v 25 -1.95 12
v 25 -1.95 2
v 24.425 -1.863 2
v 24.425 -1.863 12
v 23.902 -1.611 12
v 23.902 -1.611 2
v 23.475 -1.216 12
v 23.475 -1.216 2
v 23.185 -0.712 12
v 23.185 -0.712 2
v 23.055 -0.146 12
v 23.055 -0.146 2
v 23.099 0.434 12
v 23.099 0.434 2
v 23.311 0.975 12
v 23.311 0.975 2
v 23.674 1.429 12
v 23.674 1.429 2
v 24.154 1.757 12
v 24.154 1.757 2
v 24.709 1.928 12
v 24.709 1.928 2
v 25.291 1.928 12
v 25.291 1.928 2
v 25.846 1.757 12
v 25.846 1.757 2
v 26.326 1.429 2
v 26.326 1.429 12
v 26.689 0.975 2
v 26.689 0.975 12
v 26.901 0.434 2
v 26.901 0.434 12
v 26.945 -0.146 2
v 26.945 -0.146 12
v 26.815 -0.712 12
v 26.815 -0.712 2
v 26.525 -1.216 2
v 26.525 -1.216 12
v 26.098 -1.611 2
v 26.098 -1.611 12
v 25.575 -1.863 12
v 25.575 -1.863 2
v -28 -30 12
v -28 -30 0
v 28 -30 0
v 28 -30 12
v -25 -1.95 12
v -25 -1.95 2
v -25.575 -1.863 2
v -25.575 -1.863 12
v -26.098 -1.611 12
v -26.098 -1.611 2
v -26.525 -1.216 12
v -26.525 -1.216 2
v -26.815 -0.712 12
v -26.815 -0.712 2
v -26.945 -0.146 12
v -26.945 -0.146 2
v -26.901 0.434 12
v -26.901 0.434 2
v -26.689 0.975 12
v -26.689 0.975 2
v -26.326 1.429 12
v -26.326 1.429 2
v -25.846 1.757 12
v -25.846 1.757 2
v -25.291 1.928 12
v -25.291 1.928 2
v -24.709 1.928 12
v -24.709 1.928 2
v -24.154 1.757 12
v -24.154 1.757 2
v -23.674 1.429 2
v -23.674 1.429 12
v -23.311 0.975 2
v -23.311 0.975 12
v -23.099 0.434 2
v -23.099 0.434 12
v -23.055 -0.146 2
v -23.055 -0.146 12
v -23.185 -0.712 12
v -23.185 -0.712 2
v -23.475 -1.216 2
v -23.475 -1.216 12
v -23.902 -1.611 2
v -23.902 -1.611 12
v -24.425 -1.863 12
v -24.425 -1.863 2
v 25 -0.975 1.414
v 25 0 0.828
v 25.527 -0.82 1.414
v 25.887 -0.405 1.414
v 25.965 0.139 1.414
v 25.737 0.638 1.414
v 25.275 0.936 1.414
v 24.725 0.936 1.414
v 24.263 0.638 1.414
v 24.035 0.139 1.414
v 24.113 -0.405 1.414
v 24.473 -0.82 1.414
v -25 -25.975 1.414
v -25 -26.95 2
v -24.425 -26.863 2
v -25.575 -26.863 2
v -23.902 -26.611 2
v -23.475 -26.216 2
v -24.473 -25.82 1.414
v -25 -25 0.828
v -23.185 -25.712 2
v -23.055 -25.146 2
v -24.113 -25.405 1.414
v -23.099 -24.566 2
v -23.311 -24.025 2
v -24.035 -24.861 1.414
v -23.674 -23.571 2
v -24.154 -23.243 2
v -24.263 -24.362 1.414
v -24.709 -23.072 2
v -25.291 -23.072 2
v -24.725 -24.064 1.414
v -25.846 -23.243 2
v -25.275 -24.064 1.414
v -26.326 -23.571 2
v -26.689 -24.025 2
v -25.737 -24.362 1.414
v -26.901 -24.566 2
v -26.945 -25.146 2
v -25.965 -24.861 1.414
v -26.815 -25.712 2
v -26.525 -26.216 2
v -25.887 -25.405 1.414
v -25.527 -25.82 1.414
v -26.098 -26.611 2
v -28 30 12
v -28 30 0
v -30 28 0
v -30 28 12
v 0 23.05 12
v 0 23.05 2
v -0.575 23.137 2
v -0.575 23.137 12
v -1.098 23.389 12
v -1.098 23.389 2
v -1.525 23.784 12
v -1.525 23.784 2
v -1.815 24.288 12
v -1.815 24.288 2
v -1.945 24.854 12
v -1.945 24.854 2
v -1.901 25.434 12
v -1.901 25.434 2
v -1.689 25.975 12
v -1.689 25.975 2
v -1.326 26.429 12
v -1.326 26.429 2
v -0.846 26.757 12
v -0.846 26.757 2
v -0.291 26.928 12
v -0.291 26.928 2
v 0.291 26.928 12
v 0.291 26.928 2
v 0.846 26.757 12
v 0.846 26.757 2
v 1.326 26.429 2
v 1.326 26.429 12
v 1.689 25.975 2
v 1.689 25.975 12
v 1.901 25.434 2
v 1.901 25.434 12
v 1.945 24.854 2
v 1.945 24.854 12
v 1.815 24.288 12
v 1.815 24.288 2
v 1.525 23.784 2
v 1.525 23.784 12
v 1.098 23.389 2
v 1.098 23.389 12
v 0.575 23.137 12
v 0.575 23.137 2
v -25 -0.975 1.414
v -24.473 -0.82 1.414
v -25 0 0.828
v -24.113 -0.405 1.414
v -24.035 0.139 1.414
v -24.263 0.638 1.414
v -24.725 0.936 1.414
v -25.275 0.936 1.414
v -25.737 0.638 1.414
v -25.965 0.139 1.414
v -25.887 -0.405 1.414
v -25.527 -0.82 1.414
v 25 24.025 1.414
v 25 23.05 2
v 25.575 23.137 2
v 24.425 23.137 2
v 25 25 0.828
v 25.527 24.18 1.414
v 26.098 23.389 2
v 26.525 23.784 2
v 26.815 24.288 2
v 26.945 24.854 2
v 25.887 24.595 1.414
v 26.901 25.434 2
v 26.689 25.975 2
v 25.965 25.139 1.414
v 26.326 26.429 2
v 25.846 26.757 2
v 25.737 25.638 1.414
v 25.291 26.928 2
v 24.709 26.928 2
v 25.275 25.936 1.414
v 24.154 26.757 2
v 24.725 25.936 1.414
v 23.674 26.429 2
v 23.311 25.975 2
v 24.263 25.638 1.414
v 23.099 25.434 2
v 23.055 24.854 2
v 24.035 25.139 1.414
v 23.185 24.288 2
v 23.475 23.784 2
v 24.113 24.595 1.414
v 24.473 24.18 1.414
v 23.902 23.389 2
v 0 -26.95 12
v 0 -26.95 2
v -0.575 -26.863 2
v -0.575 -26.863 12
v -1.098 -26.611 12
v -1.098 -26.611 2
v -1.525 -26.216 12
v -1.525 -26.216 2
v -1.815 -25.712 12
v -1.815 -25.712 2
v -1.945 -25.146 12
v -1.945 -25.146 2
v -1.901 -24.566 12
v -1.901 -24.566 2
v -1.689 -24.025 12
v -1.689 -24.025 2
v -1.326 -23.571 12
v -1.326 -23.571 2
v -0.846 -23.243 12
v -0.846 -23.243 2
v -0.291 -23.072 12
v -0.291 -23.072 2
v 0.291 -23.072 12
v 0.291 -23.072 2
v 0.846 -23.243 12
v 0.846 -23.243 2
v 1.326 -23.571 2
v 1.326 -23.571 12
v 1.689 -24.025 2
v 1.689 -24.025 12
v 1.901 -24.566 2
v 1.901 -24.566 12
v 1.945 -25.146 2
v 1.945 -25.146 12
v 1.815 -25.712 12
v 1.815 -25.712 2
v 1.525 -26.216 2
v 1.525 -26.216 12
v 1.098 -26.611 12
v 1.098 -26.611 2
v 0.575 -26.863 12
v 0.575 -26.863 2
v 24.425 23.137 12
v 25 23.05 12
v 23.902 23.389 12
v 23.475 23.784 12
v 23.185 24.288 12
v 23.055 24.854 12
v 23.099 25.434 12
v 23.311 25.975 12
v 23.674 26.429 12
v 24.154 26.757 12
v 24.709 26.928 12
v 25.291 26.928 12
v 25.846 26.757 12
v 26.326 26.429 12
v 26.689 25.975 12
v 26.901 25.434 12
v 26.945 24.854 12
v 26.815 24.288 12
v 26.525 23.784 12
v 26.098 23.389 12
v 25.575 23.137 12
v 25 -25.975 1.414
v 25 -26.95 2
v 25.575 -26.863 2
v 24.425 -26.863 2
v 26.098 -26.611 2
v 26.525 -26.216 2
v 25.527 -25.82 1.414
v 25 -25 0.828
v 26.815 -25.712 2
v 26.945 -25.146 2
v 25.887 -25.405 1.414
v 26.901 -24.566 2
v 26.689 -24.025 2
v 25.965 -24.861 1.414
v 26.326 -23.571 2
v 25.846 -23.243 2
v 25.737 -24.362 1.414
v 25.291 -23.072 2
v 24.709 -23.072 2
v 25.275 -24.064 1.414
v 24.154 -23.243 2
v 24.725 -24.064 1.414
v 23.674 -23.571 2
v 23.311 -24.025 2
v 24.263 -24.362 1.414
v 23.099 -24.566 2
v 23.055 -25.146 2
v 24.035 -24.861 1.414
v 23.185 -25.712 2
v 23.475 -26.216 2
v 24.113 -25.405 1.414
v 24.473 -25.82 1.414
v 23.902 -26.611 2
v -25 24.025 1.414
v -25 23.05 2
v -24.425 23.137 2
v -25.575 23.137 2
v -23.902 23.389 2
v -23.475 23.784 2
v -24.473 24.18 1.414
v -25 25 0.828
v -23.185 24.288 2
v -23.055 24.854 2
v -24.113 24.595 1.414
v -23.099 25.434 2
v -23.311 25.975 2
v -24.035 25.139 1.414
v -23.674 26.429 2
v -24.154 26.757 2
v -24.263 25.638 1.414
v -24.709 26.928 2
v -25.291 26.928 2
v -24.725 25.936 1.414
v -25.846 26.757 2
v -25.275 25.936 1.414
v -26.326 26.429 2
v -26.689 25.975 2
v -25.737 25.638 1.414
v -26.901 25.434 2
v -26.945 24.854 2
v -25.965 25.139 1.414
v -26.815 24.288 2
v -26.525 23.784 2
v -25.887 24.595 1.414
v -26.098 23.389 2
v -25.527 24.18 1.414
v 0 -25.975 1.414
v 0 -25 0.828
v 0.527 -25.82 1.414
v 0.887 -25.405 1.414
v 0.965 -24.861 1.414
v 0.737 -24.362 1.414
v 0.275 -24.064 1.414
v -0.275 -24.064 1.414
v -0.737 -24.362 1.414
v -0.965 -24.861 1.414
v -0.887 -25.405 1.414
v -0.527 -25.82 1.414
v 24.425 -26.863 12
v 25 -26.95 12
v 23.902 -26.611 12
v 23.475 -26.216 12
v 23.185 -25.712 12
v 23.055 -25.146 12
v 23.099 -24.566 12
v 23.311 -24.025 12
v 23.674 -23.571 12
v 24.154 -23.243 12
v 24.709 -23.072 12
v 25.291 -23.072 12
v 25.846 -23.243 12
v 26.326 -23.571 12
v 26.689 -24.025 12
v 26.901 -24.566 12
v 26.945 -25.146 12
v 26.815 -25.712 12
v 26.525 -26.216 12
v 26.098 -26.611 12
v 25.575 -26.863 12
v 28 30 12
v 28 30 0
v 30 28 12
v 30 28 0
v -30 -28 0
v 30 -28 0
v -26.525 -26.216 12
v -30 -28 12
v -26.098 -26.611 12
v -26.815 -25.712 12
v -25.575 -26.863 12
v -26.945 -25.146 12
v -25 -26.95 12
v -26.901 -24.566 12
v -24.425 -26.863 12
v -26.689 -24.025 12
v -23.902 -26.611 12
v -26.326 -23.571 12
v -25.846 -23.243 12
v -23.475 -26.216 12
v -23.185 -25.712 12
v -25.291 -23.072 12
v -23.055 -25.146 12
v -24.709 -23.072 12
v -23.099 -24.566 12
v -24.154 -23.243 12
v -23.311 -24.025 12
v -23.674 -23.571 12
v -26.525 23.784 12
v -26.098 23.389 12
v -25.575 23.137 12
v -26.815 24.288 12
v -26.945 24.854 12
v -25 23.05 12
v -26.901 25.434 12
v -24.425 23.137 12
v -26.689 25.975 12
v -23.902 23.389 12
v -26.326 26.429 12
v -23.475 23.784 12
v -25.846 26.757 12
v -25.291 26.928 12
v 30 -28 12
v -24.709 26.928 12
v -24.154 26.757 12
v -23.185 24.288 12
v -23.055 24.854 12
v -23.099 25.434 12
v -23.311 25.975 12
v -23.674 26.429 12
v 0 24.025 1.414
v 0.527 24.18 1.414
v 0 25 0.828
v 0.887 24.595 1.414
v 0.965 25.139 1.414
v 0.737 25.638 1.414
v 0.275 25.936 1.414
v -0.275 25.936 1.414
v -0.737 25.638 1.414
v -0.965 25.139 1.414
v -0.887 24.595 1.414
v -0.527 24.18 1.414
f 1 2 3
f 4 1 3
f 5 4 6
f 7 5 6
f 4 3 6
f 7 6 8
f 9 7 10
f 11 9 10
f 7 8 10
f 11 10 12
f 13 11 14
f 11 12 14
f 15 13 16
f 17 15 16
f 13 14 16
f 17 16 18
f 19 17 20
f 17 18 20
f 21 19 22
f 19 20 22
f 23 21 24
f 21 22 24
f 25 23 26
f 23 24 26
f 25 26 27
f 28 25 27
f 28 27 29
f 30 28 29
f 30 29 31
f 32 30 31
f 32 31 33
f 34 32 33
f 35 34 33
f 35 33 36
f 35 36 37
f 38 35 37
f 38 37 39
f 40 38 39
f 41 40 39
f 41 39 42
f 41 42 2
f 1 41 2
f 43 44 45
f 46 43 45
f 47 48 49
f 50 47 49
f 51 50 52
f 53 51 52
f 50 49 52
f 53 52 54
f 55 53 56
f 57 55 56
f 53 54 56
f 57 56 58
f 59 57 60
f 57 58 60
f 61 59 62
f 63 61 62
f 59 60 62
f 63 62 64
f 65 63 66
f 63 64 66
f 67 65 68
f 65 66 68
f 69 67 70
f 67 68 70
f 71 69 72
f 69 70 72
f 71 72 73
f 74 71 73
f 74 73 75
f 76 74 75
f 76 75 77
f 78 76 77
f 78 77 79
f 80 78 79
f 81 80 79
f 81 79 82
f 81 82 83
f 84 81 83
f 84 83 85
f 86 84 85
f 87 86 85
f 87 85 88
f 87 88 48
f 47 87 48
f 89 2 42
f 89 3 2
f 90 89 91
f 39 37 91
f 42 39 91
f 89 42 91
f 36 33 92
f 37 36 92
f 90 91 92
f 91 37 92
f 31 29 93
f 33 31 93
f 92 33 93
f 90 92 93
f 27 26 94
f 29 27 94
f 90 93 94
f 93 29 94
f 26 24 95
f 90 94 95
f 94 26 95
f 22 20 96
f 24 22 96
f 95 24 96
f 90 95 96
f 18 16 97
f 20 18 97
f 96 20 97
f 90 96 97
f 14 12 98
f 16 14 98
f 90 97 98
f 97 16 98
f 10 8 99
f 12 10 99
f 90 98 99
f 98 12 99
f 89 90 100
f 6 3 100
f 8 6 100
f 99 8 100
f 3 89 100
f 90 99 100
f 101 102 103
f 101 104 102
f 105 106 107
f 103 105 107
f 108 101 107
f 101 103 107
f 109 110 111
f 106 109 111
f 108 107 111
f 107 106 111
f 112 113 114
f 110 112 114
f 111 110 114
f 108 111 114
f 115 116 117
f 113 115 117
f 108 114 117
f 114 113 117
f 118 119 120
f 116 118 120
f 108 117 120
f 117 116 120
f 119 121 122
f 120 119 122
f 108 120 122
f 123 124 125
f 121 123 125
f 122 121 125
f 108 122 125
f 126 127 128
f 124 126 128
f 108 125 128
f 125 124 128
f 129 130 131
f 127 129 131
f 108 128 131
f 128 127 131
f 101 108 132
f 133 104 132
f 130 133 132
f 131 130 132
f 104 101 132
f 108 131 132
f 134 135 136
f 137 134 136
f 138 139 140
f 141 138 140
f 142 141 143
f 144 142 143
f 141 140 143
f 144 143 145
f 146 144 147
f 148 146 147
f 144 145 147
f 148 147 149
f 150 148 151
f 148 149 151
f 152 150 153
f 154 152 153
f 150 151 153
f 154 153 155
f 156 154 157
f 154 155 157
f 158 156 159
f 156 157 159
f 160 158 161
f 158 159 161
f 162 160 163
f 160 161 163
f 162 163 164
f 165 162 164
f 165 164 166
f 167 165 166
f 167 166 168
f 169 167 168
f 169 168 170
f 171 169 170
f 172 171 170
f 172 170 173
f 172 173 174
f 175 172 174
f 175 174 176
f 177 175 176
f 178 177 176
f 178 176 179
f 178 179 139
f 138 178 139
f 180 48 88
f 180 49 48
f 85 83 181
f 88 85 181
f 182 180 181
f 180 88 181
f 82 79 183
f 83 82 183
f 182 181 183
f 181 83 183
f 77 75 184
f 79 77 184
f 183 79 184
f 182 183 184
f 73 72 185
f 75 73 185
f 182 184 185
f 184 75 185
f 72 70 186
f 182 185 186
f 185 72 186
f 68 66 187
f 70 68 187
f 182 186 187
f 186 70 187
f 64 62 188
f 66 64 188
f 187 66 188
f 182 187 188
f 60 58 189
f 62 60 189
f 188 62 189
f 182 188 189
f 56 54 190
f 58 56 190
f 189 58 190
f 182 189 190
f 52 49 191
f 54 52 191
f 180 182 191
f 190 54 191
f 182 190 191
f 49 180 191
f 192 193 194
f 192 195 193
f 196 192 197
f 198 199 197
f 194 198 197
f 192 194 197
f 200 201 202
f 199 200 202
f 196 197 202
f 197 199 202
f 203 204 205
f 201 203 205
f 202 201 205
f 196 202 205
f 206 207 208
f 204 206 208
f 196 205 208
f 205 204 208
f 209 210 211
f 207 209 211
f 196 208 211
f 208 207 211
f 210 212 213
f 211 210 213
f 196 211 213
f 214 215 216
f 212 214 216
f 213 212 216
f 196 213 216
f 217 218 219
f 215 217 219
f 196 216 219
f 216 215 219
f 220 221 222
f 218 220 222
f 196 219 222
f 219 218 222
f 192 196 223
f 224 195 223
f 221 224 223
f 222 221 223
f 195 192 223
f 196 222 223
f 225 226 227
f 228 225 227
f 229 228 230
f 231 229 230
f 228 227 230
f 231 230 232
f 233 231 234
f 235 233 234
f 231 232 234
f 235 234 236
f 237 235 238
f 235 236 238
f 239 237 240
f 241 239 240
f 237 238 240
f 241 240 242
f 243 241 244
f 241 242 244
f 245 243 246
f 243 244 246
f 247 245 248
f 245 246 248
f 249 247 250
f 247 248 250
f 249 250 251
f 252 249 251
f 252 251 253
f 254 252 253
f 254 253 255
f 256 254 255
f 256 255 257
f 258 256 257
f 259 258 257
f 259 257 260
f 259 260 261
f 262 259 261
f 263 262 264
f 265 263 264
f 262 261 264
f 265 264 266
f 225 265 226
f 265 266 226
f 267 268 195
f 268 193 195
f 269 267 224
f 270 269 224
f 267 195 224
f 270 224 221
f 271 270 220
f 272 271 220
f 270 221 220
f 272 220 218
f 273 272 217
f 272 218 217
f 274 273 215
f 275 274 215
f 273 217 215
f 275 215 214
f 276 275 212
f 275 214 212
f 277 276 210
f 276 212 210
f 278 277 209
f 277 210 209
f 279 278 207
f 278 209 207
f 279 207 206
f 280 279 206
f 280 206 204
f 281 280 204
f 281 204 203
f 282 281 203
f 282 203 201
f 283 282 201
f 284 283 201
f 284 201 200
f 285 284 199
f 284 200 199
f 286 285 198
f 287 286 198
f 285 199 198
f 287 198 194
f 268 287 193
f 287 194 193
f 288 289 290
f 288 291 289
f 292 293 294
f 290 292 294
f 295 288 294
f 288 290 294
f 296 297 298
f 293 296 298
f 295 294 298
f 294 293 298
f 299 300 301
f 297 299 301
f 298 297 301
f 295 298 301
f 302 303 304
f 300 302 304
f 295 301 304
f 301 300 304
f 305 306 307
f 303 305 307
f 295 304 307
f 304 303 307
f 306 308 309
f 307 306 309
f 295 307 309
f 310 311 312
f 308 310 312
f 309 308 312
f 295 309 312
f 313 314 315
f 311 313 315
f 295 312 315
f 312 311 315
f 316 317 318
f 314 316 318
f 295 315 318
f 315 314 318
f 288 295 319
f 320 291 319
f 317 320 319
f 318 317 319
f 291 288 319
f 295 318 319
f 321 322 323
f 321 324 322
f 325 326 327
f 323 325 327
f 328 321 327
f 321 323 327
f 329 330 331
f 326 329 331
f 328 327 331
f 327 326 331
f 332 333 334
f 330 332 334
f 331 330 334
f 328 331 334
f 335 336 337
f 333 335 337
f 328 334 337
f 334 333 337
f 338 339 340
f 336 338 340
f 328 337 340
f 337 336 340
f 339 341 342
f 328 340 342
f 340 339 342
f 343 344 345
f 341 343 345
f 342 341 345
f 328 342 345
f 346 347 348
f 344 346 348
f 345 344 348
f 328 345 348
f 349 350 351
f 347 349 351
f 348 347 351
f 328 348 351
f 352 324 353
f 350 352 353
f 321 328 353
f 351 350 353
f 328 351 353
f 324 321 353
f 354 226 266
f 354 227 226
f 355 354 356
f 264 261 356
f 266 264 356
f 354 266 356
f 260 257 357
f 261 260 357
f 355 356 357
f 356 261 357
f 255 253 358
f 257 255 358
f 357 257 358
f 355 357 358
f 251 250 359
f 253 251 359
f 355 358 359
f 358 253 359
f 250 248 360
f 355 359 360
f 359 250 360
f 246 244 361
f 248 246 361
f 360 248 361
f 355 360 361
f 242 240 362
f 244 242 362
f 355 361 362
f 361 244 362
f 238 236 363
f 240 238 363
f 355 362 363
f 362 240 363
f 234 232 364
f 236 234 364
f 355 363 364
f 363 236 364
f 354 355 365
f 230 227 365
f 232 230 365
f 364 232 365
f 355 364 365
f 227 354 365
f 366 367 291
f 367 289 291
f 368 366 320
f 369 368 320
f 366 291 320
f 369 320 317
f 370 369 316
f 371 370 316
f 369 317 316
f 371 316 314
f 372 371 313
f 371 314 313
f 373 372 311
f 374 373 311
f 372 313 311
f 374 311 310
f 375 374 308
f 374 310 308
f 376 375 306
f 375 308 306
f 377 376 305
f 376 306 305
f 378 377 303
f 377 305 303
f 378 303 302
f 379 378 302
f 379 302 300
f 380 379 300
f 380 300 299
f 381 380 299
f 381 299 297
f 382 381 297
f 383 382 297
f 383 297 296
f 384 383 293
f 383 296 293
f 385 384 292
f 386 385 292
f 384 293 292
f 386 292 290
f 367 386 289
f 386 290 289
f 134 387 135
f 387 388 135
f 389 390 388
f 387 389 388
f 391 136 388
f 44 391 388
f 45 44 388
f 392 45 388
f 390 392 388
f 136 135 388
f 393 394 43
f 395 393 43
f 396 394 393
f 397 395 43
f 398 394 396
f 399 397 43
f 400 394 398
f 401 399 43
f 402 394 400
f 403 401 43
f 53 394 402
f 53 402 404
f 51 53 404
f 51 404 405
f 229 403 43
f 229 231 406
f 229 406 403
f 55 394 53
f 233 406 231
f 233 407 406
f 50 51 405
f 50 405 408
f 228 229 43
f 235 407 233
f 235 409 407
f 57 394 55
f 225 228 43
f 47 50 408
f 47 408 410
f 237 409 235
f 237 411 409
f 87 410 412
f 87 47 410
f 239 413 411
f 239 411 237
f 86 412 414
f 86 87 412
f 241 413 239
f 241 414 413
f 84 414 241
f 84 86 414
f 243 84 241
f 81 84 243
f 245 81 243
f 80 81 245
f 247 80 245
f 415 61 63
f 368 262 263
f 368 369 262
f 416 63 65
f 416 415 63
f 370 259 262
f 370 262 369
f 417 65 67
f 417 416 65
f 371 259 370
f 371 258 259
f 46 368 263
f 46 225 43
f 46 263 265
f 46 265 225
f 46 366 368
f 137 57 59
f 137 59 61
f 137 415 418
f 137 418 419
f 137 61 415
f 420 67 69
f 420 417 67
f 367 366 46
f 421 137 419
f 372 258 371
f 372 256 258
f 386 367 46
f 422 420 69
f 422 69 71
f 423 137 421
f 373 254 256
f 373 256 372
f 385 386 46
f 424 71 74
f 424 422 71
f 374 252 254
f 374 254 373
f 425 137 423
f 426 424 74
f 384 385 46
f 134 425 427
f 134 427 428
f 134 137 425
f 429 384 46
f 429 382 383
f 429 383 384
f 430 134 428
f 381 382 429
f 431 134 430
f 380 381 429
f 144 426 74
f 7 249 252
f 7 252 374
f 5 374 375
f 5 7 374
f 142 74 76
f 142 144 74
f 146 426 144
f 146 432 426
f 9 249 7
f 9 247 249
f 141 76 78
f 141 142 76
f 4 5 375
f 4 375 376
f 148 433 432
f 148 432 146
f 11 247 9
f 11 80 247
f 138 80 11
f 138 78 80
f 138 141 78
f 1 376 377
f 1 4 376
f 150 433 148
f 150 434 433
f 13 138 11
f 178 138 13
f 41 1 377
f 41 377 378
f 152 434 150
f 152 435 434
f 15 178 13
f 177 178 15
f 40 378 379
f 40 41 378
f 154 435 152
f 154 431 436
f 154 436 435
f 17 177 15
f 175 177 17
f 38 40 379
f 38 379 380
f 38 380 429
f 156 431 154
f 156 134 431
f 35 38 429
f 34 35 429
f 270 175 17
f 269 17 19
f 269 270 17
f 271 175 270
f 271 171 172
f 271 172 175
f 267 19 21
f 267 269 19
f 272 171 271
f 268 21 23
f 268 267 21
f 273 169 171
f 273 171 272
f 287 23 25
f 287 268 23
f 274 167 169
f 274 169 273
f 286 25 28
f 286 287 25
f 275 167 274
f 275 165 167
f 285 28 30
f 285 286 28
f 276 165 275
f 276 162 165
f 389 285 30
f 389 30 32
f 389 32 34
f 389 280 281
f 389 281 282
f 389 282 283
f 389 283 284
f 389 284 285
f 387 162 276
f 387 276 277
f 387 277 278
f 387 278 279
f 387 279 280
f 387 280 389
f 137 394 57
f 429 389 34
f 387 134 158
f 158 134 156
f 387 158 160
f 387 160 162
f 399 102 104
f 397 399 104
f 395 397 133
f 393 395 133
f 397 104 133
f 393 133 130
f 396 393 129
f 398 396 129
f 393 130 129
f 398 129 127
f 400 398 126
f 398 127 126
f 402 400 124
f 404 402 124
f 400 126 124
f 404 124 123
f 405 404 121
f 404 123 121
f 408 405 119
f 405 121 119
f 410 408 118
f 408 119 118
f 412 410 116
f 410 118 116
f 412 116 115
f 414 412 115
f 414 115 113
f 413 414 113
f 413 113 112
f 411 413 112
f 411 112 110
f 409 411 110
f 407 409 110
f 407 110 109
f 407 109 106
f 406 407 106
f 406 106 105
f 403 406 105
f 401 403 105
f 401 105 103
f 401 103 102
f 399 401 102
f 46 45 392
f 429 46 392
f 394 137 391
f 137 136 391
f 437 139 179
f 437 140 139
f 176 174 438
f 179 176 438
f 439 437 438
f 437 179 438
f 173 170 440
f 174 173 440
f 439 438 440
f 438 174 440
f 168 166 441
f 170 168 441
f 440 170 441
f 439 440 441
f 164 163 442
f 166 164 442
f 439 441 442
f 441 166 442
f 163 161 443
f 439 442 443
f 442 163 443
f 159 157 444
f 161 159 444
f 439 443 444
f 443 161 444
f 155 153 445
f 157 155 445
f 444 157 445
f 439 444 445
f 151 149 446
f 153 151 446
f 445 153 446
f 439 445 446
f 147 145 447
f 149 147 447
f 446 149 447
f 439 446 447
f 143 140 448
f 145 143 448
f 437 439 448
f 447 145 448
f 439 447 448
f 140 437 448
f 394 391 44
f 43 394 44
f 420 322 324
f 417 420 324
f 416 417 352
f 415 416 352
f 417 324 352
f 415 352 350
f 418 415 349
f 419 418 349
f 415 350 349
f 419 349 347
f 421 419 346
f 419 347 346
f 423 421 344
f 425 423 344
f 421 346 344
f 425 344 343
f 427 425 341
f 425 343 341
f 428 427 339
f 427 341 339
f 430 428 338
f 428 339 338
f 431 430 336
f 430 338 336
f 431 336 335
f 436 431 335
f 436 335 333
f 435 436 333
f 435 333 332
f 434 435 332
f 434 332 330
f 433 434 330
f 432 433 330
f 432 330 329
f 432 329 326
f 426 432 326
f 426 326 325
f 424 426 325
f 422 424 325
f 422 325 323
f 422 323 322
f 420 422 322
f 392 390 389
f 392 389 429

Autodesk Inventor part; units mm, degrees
ref_plane "YZ Plane" through (0, 0, 0) normal (1, 0, 0) x (0, 1, 0)
ref_plane "XZ Plane" through (0, 0, 0) normal (0, 1, 0) x (-1, 0, 0)
ref_plane "XY Plane" through (0, 0, 0) normal (0, 0, 1) x (1, 0, 0)
ref_plane "Work Plane1" through (0, 0, 0) normal (0, 0, 1) x (1, 0, 0)
sketch "Sketch1" plane through (0, 0, 0) normal (0, 0, 1) x (1, 0, 0)
  line L0 (-28, 30) -> (-30, 28) projected
  line L1 (-30, 28) -> (-30, -28) projected
  line L2 (-30, -28) -> (-28, -30) projected
  line L3 (-28, -30) -> (28, -30) projected
  line L4 (28, -30) -> (30, -28) projected
  line L5 (30, -28) -> (30, -17.7934) projected
  line L6 (30, 28) -> (28, 30) projected
  line L7 (28, 30) -> (17.7934, 30) projected
  line L8 (-25, -25) -> (25, -25) construction
  line L9 (25, -25) -> (25, 25) construction
  line L10 (25, 25) -> (-25, 25) construction
  line L11 (-25, 25) -> (-25, -25) construction
  line L12 (-25, -25) -> (25, 25) construction
  line L13 (25, -25) -> (-25, 25) construction
  line L14 (30, -17.7934) -> (44, -17.7934) projected
  line L15 (44, -9.0511) -> (44, -17.7934) projected
  line L16 (30, -9.0511) -> (44, -9.0511) construction
  line L17 (30, -9.0511) -> (30, 8.3051) projected
  line L18 (30, 8.3051) -> (44, 8.3051) projected
  line L19 (44, 19.2331) -> (44, 8.3051) projected
  line L20 (30, 19.2331) -> (44, 19.2331) construction
  line L21 (30, 28) -> (30, -28) projected
  line L22 (17.7934, 30) -> (17.7934, 44) projected
  line L23 (9.0511, 44) -> (17.7934, 44) projected
  line L24 (9.0511, 30) -> (9.0511, 44) construction
  line L25 (-8.3051, 30) -> (-8.3051, 44) projected
  line L26 (-19.2331, 44) -> (-8.3051, 44) projected
  line L27 (-19.2331, 30) -> (-19.2331, 44) construction
  line L28 (-19.2331, 30) -> (-28, 30) projected
  line L29 (-28, 30) -> (28, 30) projected
  line L30 (25, 0) -> (-25, 0)
  line L31 (30, 19.2331) -> (30, 28) projected
  line L32 (9.0511, 30) -> (-8.3051, 30) projected
  point P0 (0, 0)
  dimension "d0" = 50
  dimension "d1" = 50
extrude "Extrusion1" add sketch "Sketch1" along normal blind 12
sketch "Sketch2" plane through (0, 0, 12) normal (0, 0, 1) x (1, 0, 0)
  line L0 (-25, -25) -> (25, -25)
  line L1 (25, -25) -> (25, 25)
  line L2 (25, 25) -> (-25, 25)
  line L3 (-25, 25) -> (-25, -25)
  line L4 (-25, -25) -> (25, 25) construction
  line L5 (25, -25) -> (-25, 25) construction
  point P0 (0, 0)
  point P1 (25, 0)
  point P2 (-25, 0)
  point P3 (0, 25)
  point P4 (0, -25)
  dimension "d4" = 50
  dimension "d5" = 50
hole "Hole1" at (25, 25, 12) at (25, -25, 12) at (-25, -25, 12) at (-25, 25, 12) at (-25, 0, 12) at (25, 0, 12) at (0, 25, 12) at (0, -25, 12) direction (0, 0, -1) diameter 3.9 depth 10 tip angle 118
properties part number "00_XY_stage-CHUO_SEIKI_LD-647-R1-Bottom"
